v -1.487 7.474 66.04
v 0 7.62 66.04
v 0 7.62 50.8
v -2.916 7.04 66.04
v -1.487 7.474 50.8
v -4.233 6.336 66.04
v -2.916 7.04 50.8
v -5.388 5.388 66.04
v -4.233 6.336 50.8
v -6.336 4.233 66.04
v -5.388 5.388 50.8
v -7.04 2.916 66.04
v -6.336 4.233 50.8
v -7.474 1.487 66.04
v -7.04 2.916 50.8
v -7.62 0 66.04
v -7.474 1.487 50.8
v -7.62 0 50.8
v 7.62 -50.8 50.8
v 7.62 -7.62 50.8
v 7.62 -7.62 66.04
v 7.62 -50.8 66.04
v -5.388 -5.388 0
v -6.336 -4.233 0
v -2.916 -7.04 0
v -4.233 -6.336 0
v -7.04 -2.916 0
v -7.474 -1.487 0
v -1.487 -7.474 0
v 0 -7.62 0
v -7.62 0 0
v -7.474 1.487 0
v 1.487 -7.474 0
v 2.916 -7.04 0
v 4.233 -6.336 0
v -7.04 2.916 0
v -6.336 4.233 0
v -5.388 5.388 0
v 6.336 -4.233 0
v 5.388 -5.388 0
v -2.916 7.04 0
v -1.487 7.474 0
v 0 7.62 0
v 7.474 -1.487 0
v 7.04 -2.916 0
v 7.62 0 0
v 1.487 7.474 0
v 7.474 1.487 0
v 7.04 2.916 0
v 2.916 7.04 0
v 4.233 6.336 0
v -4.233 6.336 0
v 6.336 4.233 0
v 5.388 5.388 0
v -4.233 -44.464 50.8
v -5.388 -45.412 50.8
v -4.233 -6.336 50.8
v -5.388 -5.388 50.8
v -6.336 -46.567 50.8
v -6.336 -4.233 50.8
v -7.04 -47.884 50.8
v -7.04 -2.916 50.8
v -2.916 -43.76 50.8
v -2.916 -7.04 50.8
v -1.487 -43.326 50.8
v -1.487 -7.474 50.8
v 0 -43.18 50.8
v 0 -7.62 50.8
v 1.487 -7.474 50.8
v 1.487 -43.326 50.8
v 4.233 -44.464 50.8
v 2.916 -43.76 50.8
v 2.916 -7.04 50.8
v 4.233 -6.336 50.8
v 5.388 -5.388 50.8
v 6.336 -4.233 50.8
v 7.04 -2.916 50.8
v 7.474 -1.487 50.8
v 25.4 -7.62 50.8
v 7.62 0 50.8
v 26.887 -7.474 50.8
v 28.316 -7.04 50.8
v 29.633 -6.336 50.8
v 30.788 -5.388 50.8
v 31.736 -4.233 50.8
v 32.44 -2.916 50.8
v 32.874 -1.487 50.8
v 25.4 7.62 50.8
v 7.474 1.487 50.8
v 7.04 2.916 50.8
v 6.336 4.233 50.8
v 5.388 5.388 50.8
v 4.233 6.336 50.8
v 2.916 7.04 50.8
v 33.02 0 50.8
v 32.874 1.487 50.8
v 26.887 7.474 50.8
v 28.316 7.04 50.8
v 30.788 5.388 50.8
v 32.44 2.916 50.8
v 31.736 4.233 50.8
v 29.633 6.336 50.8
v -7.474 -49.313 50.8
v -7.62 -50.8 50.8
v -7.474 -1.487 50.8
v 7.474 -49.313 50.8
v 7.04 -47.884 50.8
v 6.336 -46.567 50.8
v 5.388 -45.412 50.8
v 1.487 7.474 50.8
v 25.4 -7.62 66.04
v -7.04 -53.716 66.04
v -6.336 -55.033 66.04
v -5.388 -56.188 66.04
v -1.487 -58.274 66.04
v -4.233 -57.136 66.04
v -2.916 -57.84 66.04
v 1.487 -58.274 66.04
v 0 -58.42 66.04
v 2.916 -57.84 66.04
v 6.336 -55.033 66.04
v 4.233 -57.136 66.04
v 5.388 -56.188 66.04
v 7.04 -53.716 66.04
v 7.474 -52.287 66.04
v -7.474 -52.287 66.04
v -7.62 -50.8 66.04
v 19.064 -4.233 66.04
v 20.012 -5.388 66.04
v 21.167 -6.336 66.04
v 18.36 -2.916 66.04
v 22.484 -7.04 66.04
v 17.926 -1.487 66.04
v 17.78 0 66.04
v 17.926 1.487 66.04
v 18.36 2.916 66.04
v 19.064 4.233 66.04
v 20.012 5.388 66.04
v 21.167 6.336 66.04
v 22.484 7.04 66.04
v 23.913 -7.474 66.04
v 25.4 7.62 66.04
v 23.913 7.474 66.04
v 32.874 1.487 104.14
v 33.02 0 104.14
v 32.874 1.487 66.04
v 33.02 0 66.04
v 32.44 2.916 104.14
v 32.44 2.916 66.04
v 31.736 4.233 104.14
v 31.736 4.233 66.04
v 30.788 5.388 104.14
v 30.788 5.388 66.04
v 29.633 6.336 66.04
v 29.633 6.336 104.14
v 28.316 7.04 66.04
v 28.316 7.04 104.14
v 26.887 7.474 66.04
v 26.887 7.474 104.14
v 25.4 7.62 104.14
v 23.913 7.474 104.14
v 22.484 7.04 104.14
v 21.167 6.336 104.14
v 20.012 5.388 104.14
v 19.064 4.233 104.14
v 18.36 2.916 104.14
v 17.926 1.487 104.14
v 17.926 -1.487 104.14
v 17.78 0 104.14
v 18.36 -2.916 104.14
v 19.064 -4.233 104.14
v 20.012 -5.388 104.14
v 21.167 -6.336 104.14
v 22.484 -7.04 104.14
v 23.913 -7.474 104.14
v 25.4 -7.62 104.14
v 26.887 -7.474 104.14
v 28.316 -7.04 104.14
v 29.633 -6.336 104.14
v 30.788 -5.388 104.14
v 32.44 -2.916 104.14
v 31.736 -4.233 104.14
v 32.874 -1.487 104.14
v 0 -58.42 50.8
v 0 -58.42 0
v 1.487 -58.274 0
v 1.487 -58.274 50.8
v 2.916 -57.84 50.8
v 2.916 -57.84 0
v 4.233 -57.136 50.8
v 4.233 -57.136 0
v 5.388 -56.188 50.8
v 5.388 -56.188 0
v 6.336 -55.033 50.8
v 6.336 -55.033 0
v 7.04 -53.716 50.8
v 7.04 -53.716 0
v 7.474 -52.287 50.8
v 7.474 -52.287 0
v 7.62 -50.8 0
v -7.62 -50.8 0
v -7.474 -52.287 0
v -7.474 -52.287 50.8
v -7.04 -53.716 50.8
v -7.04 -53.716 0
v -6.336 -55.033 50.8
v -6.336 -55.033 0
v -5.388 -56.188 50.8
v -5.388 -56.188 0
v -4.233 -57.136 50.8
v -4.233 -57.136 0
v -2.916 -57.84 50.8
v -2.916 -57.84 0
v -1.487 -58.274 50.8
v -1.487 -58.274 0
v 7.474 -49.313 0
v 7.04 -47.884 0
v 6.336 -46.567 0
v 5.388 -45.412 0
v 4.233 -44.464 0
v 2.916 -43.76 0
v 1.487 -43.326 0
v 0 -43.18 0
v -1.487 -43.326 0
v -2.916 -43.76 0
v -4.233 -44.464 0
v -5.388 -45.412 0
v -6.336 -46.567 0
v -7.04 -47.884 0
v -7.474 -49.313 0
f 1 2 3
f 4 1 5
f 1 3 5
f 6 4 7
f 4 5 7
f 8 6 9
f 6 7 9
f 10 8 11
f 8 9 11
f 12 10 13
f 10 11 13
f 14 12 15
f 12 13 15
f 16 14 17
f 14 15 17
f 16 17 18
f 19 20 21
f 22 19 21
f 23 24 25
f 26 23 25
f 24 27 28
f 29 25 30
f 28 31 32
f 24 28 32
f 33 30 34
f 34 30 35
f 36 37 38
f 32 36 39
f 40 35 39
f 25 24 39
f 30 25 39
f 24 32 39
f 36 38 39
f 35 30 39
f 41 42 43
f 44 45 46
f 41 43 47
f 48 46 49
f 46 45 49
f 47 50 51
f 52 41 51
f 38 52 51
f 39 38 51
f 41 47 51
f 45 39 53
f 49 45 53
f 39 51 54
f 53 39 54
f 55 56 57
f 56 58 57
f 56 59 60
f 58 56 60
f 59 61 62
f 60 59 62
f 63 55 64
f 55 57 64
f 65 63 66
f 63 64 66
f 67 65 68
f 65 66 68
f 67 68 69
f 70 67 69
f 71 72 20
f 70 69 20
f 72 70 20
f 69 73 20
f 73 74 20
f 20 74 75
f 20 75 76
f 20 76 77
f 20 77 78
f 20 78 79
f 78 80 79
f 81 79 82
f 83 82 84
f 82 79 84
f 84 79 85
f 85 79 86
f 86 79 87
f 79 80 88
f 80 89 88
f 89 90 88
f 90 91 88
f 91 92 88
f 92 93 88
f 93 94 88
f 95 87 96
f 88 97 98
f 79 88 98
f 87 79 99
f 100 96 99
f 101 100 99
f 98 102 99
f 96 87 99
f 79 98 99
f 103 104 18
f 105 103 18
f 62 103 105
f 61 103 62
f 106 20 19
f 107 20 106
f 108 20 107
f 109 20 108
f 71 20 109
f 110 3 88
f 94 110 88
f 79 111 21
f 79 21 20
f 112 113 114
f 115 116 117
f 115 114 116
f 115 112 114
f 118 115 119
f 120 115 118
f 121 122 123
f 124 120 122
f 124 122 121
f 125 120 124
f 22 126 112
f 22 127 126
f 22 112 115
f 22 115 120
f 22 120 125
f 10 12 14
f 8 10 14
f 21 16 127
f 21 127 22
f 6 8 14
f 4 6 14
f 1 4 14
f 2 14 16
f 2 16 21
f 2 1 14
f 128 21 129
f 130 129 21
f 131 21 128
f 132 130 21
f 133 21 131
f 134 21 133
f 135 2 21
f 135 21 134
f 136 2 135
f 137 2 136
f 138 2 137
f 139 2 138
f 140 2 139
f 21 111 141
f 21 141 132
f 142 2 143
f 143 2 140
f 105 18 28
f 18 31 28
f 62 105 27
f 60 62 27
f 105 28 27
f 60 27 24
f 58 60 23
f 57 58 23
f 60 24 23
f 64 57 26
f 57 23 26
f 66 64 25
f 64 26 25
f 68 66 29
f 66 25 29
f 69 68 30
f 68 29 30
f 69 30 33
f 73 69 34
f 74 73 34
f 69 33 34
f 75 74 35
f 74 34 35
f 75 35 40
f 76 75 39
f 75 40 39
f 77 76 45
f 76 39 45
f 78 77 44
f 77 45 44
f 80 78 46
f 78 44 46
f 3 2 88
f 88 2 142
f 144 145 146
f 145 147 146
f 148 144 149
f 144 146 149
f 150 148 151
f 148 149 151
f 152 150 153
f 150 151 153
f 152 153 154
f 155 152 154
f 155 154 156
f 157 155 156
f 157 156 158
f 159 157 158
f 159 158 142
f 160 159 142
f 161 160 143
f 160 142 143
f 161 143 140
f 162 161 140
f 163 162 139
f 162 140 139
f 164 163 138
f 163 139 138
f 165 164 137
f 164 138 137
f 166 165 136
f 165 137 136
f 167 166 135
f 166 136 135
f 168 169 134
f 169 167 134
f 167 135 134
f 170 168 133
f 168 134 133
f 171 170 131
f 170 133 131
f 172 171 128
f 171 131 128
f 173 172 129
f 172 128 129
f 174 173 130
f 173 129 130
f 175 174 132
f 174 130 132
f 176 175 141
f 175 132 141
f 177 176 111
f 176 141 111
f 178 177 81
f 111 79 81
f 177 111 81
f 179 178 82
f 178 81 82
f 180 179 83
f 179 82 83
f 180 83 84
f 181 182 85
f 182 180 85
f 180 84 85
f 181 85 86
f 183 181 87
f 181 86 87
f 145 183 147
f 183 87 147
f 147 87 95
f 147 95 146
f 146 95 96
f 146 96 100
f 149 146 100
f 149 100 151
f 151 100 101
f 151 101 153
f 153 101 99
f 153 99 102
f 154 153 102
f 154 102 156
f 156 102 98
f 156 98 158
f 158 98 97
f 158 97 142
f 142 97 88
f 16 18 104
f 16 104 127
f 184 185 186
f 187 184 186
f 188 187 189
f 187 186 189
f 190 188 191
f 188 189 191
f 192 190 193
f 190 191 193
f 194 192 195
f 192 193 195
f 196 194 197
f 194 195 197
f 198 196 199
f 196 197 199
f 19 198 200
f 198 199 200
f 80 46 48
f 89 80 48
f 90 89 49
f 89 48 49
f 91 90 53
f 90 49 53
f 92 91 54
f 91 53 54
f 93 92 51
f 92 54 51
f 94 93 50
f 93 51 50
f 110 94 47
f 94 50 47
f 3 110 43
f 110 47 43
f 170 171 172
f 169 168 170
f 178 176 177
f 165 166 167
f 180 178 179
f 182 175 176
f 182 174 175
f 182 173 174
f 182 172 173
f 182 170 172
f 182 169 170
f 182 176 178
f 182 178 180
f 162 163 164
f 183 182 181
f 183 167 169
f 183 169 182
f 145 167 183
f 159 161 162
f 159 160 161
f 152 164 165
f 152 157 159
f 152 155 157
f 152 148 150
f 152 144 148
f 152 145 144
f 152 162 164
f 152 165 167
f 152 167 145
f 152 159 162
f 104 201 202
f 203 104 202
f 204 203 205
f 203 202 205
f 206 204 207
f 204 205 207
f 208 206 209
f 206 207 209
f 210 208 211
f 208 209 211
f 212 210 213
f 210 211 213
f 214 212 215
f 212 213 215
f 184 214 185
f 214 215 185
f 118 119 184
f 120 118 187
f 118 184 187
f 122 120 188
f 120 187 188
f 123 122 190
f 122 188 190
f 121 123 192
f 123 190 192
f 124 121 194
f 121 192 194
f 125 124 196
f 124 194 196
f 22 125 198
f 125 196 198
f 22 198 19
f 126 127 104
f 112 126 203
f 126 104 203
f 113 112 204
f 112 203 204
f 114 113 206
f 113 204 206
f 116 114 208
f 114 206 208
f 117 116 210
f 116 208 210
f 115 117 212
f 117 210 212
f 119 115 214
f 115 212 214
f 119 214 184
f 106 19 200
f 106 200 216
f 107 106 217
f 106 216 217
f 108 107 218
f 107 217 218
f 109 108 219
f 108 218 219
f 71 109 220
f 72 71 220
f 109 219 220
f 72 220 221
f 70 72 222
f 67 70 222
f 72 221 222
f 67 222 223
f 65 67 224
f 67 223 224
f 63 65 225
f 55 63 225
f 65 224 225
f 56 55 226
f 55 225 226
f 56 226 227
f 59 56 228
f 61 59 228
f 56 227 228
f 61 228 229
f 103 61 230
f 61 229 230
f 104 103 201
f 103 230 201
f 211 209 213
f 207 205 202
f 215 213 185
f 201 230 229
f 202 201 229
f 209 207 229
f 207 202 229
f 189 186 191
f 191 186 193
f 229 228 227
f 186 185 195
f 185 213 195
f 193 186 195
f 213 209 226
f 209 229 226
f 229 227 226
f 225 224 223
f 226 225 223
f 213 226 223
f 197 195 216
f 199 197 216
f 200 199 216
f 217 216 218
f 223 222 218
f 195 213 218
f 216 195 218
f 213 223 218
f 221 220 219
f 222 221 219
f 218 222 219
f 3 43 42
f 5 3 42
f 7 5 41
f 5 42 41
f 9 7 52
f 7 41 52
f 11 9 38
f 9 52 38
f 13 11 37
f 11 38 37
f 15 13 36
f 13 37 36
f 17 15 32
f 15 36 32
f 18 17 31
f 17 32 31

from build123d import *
from build123d.topology import SkipClean

# Parameters (mm, degrees)
SKETCH2_R                = 7.62
BOSS_EXTRUDE1_DEPTH      = 50.8
SKETCH2_R_2              = 7.619999999999999
BOSS_EXTRUDE1_2_DEPTH    = 50.8
SKETCH4_W                = 15.239999999999998
SKETCH4_H                = 15.239999999999998
BOSS_EXTRUDE3_DEPTH      = 15.239999999999998
SKETCH6_W                = 15.240000000000016
SKETCH6_H                = 15.239999999999998
BOSS_EXTRUDE4_DEPTH      = 25.4
SKETCH7_R                = 7.619999999999997
BOSS_EXTRUDE6_DEPTH      = 38.1
CUT_EXTRUDE1_DEPTH       = 86.10600000000002
CUT_EXTRUDE2_START       = -86.10600000000002
CUT_EXTRUDE2_DEPTH       = 86.10600000000002
BOSS_EXTRUDE7_DEPTH      = 50.8
BOSS_EXTRUDE7_DEPTH_BACK = 15.239999999999998
SKETCH10_W               = 15.239999999999998
SKETCH10_H               = 15.240000000000016
CUT_EXTRUDE6_DEPTH       = 92.45600000000002


with BuildPart() as part:
    # Sketch2 → Boss-Extrude1 (new body)
    with BuildSketch(Plane.XY):
        Circle(SKETCH2_R)
    extrude(amount=BOSS_EXTRUDE1_DEPTH)

    # Sketch4 → Boss-Extrude3 (add)
    with BuildSketch(Plane.XY.offset(50.8)):
        Rectangle(SKETCH4_W, SKETCH4_H)
    extrude(amount=BOSS_EXTRUDE3_DEPTH)

    # Sketch6 → Boss-Extrude4 (add)
    with BuildSketch(Plane(origin=(7.619999999999999, 0, 0), x_dir=(0, 0, -1), z_dir=(1, 0, 0))):
        with Locations((-58.42, 0)):
            Rectangle(SKETCH6_W, SKETCH6_H)
    extrude(amount=BOSS_EXTRUDE4_DEPTH)

    # Sketch7 → Boss-Extrude6 (add)
    with BuildSketch(Plane.XY.offset(66.04)):
        with Locations((25.400000000000002, 0)):
            Circle(SKETCH7_R)
    extrude(amount=BOSS_EXTRUDE6_DEPTH)

    # Sketch8 → Cut-Extrude1 (cut)
    with BuildSketch(Plane(origin=(0, 0, 0), x_dir=(-1, 0, 0), z_dir=(0, 0, -1))):
        with BuildLine():
            Line((7.619999999999999, 0), (7.619999999999999, 7.619999999999999))
            Line((7.619999999999999, 7.619999999999999), (3.2596e-13, 7.619999999999999))
            ThreePointArc((3.2702e-13, 7.62), (5.388153672641607, 5.388153672641376), (7.62, 0))
        make_face()
        with BuildLine():
            Line((7.619999999999999, -7.619999999999997), (7.619999999999999, 0))
            ThreePointArc((7.62, -1.87e-15), (5.3881536742144505, -5.388153671068534), (4.44899204e-09, -7.62))
            Line((4.44899229e-09, -7.619999999999997), (7.619999999999999, -7.619999999999997))
        make_face()
    extrude(amount=-CUT_EXTRUDE1_DEPTH, mode=Mode.SUBTRACT)

    # Sketch9 → Cut-Extrude2 (cut)
    with BuildSketch(Plane.XY.offset(104.14000000000001).offset(CUT_EXTRUDE2_START)):
        with BuildLine():
            Line((33.02, 0), (33.02, 7.619999999999999))
            Line((33.02, 7.619999999999999), (25.40000000000031, 7.619999999999999))
            ThreePointArc((25.40000000000031, 7.619999999999997), (30.788153672641602, 5.388153672641381), (33.019999999999996, 0))
        make_face()
        with BuildLine():
            Line((33.02, -7.619999999999997), (33.02, 0))
            ThreePointArc((33.019999999999996, -1.87e-15), (30.788153672641606, -5.388153672641376), (25.400000000000325, -7.619999999999997))
            Line((25.400000000000325, -7.619999999999997), (33.02, -7.619999999999997))
        make_face()
    extrude(amount=CUT_EXTRUDE2_DEPTH, mode=Mode.SUBTRACT)



with BuildPart() as body_2:
    # Sketch2 → Boss-Extrude1 2 (new body)
    with BuildSketch(Plane.XY):
        with Locations((6.22e-15, -50.8)):
            Circle(SKETCH2_R_2)
    extrude(amount=BOSS_EXTRUDE1_2_DEPTH)


with BuildPart() as part_1:
    add(part.part)

    add(body_2.part)  # Boss-Extrude7 merges body 2
    # Sketch10 → Boss-Extrude7 (add, two sides: drawn at the far end of the back side and taken through both)
    with BuildSketch(Plane.XZ.offset(7.619999999999999).offset(-BOSS_EXTRUDE7_DEPTH_BACK)):
        with Locations((0, 58.42)):
            Rectangle(SKETCH10_W, SKETCH10_H)
    extrude(amount=BOSS_EXTRUDE7_DEPTH + BOSS_EXTRUDE7_DEPTH_BACK)

    # Sketch13 → Cut-Extrude6 (cut)
    with SkipClean():  # the faces are left unmerged after this step: merging them gives an invalid solid
        with BuildSketch(Plane(origin=(0, 0, 0), x_dir=(-1, 0, 0), z_dir=(0, 0, -1))):
            with BuildLine():
                Line((7.619999999999999, 0), (7.619999999999999, 7.619999999999999))
                Line((7.619999999999999, 7.619999999999999), (3.2685e-13, 7.619999999999999))
                ThreePointArc((3.2702e-13, 7.62), (5.388153672641607, 5.388153672641376), (7.62, 0))
            make_face()
            with BuildLine():
                Line((3.895929446e-08, -58.42), (7.619999999999999, -58.42))
                Line((7.619999999999999, -58.42), (7.619999999999999, -50.8))
                ThreePointArc((7.619999999999991, -50.8), (5.388153686415675, -56.18815365886729), (3.895929121e-08, -58.419999999999995))
            make_face()
            with BuildLine():
                Line((-7.619999999999999, -58.42), (3.895929446e-08, -58.42))
                ThreePointArc((3.895929121e-08, -58.419999999999995), (-5.388153658867306, -56.18815368641568), (-7.620000000000004, -50.8))
                Line((-7.619999999999998, -50.8), (-7.619999999999998, -58.42))
            make_face()
        extrude(amount=-CUT_EXTRUDE6_DEPTH, mode=Mode.SUBTRACT)


solid = part_1.part
